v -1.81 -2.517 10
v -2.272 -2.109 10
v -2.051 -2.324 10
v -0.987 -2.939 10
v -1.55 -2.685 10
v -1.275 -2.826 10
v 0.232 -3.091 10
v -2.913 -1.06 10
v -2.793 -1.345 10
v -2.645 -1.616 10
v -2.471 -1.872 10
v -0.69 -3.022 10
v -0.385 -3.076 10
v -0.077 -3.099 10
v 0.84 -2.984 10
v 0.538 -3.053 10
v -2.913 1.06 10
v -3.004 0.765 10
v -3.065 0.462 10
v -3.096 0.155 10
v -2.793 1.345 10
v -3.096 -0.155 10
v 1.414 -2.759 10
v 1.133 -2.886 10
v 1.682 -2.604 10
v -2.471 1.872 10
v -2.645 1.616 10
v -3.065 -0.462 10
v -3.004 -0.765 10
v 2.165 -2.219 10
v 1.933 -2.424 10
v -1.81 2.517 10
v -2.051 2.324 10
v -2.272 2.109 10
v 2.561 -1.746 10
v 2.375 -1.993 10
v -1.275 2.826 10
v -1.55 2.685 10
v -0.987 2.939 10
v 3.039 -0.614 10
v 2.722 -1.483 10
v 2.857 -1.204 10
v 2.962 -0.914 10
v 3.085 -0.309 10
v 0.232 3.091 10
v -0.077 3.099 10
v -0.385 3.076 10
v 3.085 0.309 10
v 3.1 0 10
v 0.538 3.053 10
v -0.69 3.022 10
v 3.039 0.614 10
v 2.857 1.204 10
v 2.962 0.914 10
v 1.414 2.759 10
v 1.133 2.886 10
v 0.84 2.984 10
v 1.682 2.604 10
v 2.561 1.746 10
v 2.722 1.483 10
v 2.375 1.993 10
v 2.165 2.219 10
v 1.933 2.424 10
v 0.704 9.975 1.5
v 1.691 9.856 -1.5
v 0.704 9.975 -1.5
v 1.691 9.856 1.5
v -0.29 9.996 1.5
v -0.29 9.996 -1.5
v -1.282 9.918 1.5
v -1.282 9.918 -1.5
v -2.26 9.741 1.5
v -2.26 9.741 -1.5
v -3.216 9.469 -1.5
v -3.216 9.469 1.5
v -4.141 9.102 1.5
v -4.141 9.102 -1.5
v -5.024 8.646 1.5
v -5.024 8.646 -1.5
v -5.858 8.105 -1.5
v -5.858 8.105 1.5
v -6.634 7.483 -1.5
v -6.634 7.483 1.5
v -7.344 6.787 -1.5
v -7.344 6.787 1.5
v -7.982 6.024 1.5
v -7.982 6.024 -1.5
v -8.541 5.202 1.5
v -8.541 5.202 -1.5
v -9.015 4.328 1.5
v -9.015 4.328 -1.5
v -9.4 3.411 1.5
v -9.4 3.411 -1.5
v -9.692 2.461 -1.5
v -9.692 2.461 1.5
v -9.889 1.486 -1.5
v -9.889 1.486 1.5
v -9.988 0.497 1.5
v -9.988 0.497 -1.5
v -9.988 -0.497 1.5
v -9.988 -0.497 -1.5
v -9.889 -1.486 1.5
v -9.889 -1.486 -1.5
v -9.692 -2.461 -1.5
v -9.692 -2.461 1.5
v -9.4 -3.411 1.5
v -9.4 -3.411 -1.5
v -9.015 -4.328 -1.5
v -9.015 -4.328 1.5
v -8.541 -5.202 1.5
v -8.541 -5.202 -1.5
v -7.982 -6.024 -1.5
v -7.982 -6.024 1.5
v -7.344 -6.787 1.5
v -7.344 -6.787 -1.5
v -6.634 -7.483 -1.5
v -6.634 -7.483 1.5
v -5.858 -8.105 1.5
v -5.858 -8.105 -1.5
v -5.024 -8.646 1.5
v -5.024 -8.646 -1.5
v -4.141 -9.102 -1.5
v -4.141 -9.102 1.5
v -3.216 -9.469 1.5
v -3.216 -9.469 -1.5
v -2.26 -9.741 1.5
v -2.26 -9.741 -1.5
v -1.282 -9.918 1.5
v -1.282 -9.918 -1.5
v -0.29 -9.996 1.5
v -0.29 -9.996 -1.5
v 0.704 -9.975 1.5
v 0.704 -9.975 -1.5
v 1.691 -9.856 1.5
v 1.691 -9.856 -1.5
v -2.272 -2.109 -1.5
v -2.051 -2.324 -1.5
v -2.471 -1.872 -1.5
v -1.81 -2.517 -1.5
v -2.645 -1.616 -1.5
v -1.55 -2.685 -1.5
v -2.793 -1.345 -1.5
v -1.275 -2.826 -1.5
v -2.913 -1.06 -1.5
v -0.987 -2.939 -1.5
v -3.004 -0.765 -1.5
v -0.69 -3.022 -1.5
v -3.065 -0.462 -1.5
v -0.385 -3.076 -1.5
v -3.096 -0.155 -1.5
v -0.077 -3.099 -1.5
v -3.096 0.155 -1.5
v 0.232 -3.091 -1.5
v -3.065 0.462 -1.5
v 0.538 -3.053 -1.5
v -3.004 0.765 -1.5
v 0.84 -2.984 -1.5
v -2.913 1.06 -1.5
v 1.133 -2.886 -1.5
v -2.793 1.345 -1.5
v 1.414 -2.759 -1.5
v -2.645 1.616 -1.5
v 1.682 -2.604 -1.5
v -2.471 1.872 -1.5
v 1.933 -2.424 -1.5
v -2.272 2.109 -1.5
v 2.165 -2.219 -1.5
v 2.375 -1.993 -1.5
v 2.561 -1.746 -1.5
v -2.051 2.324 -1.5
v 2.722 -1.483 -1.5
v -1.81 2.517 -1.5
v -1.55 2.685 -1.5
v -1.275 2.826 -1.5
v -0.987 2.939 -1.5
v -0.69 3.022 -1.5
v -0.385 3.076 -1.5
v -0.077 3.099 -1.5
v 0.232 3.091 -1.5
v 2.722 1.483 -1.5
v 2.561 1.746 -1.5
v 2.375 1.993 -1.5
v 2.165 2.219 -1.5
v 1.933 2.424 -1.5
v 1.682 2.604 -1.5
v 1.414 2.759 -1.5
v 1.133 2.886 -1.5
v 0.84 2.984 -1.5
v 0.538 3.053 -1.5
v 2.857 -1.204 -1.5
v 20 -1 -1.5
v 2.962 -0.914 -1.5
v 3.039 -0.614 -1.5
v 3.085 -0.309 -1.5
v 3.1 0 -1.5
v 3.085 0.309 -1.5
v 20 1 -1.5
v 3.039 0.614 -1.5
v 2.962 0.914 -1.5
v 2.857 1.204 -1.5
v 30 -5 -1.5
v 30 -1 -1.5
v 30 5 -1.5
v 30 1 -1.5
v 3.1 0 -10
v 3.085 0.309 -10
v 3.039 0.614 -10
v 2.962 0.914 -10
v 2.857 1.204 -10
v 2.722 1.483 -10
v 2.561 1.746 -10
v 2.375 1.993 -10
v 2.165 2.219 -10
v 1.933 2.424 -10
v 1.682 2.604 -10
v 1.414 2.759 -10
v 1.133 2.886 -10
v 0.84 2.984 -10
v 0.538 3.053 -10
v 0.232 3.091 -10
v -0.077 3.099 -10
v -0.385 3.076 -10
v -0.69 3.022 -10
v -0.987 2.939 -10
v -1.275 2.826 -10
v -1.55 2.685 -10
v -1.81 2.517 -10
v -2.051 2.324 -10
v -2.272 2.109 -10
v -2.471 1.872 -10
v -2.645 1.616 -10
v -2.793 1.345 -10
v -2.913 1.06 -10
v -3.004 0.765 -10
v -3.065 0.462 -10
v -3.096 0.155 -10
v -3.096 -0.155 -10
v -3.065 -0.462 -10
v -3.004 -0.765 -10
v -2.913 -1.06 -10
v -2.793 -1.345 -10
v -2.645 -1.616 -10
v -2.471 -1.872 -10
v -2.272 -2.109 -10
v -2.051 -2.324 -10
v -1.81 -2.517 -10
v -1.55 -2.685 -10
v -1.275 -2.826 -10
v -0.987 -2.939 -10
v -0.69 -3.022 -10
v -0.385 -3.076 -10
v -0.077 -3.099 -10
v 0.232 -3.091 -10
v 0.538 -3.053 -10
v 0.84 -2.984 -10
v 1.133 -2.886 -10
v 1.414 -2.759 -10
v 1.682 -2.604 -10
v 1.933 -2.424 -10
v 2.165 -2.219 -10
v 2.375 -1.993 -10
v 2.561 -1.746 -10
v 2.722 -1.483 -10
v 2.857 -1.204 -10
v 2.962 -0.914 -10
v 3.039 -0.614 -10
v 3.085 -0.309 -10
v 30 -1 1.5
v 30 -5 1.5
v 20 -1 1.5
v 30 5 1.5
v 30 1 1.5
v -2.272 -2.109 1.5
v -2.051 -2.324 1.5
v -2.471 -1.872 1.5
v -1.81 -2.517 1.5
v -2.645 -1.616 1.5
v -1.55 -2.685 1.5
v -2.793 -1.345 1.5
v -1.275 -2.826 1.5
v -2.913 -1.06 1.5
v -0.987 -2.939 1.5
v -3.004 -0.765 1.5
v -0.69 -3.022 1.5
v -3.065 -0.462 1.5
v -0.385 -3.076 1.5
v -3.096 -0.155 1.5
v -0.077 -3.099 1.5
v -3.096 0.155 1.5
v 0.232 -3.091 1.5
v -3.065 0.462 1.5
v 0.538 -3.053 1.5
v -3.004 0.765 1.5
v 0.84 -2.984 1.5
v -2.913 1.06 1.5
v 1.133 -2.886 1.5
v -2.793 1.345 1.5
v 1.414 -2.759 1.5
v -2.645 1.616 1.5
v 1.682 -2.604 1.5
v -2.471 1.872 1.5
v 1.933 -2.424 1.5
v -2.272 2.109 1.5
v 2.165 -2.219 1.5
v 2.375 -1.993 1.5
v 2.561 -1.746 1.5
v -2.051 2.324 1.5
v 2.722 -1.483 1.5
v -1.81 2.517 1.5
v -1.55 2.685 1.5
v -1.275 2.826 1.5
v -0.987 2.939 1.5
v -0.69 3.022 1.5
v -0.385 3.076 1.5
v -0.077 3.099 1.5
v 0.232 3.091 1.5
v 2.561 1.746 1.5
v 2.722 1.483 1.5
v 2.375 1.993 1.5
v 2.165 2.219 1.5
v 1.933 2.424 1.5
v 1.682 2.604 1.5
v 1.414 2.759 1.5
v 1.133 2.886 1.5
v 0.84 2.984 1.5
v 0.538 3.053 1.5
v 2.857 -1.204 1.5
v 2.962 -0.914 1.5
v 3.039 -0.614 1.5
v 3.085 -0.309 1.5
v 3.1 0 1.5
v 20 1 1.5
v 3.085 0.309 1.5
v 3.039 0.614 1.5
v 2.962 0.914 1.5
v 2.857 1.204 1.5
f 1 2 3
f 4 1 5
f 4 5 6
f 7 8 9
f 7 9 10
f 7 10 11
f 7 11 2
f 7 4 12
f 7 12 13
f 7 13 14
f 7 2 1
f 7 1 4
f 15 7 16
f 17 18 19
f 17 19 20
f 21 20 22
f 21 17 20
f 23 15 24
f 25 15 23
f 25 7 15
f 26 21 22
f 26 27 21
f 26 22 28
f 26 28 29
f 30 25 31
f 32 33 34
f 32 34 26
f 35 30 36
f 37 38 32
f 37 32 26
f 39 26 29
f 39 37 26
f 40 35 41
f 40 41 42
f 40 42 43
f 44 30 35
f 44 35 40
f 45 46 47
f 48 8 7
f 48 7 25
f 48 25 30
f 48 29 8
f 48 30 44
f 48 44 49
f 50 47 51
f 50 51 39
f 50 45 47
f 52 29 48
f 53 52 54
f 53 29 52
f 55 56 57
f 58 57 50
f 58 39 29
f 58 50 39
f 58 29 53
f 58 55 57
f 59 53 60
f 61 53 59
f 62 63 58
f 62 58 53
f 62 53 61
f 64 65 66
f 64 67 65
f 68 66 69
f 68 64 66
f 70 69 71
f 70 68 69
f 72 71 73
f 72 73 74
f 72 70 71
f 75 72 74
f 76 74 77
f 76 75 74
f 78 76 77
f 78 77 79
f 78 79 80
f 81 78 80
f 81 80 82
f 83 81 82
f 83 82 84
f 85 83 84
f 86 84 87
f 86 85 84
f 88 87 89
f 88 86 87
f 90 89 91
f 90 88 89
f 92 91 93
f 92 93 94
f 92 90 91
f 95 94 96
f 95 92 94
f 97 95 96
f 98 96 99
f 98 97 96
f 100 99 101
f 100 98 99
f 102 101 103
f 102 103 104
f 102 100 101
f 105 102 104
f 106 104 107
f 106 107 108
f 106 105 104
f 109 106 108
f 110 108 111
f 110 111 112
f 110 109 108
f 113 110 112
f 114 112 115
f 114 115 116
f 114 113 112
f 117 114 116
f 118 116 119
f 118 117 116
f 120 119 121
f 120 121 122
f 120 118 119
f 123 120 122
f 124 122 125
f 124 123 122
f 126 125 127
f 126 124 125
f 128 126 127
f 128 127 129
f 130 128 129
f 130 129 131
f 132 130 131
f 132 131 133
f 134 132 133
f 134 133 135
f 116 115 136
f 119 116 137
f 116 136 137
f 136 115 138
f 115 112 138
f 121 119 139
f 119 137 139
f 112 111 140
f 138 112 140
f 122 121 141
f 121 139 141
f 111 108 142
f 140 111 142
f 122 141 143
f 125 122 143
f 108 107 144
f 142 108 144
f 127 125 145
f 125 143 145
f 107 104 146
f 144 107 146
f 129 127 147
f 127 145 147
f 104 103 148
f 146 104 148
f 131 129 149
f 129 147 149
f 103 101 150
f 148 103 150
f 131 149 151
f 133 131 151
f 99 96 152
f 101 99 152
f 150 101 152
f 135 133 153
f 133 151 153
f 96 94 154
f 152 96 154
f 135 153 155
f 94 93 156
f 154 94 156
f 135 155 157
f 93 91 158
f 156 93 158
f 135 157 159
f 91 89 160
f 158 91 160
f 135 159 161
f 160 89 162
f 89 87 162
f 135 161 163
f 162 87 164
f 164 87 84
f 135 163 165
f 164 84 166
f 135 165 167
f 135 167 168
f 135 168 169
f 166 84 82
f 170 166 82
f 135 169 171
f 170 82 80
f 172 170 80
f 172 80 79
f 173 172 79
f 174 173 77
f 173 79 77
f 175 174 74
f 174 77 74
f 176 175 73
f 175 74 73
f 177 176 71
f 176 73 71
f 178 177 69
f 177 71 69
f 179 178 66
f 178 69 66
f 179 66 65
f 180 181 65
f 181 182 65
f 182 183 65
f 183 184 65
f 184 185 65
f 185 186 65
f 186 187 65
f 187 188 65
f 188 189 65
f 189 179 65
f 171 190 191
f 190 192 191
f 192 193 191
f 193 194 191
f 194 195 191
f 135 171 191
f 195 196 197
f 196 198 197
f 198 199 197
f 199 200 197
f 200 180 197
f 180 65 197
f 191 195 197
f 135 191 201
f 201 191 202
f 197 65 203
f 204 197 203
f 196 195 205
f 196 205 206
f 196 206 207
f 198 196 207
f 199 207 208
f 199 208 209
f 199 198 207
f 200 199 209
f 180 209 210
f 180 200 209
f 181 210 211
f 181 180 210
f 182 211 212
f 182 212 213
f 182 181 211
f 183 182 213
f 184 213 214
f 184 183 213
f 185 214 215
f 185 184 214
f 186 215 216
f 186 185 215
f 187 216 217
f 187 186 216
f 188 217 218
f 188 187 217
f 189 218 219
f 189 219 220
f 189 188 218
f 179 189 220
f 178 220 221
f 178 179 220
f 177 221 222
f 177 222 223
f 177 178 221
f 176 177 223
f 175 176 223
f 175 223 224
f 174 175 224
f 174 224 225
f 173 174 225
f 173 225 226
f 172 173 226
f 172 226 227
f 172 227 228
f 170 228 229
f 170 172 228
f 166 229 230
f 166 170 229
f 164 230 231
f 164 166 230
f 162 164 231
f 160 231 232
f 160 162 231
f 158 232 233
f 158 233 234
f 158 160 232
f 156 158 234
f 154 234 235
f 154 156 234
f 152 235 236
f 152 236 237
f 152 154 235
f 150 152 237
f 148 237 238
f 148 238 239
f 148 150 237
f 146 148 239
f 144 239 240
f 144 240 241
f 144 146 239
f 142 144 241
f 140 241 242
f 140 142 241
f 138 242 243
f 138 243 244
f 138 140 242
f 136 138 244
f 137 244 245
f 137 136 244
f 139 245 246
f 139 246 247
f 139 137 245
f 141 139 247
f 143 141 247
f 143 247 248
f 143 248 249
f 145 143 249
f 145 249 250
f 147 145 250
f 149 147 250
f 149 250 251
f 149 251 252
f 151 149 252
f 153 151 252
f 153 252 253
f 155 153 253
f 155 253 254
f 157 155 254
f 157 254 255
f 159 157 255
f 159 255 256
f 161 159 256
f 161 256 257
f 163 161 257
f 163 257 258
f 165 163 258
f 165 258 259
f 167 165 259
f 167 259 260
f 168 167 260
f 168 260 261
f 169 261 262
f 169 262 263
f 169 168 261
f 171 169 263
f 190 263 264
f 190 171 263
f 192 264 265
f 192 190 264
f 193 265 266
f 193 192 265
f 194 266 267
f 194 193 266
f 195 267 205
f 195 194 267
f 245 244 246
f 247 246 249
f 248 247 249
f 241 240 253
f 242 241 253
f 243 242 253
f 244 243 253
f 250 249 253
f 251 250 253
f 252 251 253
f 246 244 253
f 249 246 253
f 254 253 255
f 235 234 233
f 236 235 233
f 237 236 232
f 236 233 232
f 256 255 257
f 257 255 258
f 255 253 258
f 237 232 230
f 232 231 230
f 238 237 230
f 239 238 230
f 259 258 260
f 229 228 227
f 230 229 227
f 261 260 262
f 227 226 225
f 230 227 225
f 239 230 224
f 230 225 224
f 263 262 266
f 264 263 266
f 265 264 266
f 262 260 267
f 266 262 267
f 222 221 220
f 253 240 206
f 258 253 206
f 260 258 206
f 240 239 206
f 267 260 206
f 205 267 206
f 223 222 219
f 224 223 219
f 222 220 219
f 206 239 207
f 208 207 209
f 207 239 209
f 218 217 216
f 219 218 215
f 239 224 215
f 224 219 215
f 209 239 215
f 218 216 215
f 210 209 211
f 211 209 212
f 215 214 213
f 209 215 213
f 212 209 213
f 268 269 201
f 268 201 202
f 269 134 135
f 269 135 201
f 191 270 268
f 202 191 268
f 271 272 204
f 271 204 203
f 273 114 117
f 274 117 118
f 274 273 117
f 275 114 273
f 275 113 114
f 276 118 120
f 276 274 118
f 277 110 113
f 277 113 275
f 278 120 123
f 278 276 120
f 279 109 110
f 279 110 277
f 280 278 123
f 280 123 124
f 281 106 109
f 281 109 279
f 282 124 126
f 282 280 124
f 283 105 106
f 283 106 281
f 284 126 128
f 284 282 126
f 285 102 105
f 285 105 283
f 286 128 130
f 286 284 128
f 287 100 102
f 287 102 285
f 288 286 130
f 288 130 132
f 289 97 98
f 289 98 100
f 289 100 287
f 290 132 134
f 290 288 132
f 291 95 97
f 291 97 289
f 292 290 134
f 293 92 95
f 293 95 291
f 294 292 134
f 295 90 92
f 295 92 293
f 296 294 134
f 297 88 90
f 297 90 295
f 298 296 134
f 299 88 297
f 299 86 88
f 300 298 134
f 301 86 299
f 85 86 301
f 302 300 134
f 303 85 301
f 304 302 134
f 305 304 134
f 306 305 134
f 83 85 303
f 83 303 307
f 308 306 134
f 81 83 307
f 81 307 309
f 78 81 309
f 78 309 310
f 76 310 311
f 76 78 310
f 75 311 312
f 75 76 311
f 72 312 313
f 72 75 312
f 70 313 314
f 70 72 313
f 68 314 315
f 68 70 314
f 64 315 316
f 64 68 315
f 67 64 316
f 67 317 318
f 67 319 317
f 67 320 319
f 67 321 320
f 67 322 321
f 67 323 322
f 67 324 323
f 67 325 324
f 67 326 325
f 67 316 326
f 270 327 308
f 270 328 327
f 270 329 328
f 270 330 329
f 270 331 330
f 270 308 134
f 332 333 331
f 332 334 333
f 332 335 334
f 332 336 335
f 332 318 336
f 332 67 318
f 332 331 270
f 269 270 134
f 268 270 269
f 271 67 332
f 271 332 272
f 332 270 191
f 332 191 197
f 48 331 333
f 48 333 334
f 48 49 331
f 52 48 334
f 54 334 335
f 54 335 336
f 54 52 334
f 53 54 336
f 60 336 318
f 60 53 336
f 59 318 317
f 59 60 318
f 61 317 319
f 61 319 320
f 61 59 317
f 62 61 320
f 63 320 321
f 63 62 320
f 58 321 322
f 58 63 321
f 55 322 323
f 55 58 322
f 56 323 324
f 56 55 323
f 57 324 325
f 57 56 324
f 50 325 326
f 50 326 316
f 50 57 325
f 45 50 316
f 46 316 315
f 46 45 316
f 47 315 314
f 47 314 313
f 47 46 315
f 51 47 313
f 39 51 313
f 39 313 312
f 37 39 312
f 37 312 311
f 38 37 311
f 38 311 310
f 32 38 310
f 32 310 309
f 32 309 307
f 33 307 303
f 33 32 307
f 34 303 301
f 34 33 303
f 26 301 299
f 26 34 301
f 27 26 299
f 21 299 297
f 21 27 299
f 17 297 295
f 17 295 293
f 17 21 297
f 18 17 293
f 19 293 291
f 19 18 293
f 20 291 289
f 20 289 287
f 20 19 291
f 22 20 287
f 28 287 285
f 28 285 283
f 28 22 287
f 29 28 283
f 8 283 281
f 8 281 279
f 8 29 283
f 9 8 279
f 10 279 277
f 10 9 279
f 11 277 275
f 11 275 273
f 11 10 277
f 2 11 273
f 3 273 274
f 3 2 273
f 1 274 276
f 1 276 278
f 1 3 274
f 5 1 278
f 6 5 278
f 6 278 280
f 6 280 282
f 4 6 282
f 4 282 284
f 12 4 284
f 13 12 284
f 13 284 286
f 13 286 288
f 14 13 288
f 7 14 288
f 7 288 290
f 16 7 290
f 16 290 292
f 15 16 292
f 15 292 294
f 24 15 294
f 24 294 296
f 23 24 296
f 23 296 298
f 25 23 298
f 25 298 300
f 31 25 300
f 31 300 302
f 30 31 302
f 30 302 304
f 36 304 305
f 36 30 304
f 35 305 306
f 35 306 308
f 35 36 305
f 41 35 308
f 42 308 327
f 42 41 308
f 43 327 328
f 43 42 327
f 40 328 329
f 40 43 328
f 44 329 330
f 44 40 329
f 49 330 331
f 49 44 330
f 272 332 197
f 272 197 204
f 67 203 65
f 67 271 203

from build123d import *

# Parameters (mm, degrees)
F0_R     = 3.1
F1_DEPTH = 10
F2_DEPTH = 1.5
F3_W     = 10
F3_H     = 2
F4_DEPTH = 11.501


# Not quite as in the source:
# - a feature names something its author has since deleted; it is built from what else it names


with BuildPart() as f1:
    # F0 (on Top) → F1 (new body, symmetric)
    with BuildSketch(Plane.XY):
        Circle(F0_R)
    extrude(amount=F1_DEPTH, both=True)

    # F0 (on Top) → F2 (join, symmetric)
    with BuildSketch(Plane.XY):
        with BuildLine():
            ThreePointArc((1.6906574466, -9.8560477575), (7.6454749514, -6.4456739576), (10, 0))
            ThreePointArc((10, 0), (7.6454749525, 6.4456739563), (1.6906574499, 9.8560477569))
            ThreePointArc((1.6906574499, 9.8560477569), (-10, 1.7e-09), (1.6906574466, -9.8560477575))
        make_face()
        Circle(F0_R, mode=Mode.SUBTRACT)
        with BuildLine():
            ThreePointArc((1.6906574499, 9.8560477569), (7.6454749525, 6.4456739563), (10, 0))
            ThreePointArc((10, 0), (7.6454749514, -6.4456739576), (1.6906574466, -9.8560477575))
            Line((1.6906574466, -9.8560477575), (30, -5))
            Line((30, -5), (30, 5))
            Line((30, 5), (1.6906574499, 9.8560477569))
        make_face()
    extrude(amount=F2_DEPTH, both=True)

    # F3 (on face) → F4 (cut, through all)
    with BuildSketch(Plane.XY.offset(1.5)):
        with Locations((25, 0)):
            Rectangle(F3_W, F3_H)
    extrude(amount=-F4_DEPTH, mode=Mode.SUBTRACT)


solid = f1.part
